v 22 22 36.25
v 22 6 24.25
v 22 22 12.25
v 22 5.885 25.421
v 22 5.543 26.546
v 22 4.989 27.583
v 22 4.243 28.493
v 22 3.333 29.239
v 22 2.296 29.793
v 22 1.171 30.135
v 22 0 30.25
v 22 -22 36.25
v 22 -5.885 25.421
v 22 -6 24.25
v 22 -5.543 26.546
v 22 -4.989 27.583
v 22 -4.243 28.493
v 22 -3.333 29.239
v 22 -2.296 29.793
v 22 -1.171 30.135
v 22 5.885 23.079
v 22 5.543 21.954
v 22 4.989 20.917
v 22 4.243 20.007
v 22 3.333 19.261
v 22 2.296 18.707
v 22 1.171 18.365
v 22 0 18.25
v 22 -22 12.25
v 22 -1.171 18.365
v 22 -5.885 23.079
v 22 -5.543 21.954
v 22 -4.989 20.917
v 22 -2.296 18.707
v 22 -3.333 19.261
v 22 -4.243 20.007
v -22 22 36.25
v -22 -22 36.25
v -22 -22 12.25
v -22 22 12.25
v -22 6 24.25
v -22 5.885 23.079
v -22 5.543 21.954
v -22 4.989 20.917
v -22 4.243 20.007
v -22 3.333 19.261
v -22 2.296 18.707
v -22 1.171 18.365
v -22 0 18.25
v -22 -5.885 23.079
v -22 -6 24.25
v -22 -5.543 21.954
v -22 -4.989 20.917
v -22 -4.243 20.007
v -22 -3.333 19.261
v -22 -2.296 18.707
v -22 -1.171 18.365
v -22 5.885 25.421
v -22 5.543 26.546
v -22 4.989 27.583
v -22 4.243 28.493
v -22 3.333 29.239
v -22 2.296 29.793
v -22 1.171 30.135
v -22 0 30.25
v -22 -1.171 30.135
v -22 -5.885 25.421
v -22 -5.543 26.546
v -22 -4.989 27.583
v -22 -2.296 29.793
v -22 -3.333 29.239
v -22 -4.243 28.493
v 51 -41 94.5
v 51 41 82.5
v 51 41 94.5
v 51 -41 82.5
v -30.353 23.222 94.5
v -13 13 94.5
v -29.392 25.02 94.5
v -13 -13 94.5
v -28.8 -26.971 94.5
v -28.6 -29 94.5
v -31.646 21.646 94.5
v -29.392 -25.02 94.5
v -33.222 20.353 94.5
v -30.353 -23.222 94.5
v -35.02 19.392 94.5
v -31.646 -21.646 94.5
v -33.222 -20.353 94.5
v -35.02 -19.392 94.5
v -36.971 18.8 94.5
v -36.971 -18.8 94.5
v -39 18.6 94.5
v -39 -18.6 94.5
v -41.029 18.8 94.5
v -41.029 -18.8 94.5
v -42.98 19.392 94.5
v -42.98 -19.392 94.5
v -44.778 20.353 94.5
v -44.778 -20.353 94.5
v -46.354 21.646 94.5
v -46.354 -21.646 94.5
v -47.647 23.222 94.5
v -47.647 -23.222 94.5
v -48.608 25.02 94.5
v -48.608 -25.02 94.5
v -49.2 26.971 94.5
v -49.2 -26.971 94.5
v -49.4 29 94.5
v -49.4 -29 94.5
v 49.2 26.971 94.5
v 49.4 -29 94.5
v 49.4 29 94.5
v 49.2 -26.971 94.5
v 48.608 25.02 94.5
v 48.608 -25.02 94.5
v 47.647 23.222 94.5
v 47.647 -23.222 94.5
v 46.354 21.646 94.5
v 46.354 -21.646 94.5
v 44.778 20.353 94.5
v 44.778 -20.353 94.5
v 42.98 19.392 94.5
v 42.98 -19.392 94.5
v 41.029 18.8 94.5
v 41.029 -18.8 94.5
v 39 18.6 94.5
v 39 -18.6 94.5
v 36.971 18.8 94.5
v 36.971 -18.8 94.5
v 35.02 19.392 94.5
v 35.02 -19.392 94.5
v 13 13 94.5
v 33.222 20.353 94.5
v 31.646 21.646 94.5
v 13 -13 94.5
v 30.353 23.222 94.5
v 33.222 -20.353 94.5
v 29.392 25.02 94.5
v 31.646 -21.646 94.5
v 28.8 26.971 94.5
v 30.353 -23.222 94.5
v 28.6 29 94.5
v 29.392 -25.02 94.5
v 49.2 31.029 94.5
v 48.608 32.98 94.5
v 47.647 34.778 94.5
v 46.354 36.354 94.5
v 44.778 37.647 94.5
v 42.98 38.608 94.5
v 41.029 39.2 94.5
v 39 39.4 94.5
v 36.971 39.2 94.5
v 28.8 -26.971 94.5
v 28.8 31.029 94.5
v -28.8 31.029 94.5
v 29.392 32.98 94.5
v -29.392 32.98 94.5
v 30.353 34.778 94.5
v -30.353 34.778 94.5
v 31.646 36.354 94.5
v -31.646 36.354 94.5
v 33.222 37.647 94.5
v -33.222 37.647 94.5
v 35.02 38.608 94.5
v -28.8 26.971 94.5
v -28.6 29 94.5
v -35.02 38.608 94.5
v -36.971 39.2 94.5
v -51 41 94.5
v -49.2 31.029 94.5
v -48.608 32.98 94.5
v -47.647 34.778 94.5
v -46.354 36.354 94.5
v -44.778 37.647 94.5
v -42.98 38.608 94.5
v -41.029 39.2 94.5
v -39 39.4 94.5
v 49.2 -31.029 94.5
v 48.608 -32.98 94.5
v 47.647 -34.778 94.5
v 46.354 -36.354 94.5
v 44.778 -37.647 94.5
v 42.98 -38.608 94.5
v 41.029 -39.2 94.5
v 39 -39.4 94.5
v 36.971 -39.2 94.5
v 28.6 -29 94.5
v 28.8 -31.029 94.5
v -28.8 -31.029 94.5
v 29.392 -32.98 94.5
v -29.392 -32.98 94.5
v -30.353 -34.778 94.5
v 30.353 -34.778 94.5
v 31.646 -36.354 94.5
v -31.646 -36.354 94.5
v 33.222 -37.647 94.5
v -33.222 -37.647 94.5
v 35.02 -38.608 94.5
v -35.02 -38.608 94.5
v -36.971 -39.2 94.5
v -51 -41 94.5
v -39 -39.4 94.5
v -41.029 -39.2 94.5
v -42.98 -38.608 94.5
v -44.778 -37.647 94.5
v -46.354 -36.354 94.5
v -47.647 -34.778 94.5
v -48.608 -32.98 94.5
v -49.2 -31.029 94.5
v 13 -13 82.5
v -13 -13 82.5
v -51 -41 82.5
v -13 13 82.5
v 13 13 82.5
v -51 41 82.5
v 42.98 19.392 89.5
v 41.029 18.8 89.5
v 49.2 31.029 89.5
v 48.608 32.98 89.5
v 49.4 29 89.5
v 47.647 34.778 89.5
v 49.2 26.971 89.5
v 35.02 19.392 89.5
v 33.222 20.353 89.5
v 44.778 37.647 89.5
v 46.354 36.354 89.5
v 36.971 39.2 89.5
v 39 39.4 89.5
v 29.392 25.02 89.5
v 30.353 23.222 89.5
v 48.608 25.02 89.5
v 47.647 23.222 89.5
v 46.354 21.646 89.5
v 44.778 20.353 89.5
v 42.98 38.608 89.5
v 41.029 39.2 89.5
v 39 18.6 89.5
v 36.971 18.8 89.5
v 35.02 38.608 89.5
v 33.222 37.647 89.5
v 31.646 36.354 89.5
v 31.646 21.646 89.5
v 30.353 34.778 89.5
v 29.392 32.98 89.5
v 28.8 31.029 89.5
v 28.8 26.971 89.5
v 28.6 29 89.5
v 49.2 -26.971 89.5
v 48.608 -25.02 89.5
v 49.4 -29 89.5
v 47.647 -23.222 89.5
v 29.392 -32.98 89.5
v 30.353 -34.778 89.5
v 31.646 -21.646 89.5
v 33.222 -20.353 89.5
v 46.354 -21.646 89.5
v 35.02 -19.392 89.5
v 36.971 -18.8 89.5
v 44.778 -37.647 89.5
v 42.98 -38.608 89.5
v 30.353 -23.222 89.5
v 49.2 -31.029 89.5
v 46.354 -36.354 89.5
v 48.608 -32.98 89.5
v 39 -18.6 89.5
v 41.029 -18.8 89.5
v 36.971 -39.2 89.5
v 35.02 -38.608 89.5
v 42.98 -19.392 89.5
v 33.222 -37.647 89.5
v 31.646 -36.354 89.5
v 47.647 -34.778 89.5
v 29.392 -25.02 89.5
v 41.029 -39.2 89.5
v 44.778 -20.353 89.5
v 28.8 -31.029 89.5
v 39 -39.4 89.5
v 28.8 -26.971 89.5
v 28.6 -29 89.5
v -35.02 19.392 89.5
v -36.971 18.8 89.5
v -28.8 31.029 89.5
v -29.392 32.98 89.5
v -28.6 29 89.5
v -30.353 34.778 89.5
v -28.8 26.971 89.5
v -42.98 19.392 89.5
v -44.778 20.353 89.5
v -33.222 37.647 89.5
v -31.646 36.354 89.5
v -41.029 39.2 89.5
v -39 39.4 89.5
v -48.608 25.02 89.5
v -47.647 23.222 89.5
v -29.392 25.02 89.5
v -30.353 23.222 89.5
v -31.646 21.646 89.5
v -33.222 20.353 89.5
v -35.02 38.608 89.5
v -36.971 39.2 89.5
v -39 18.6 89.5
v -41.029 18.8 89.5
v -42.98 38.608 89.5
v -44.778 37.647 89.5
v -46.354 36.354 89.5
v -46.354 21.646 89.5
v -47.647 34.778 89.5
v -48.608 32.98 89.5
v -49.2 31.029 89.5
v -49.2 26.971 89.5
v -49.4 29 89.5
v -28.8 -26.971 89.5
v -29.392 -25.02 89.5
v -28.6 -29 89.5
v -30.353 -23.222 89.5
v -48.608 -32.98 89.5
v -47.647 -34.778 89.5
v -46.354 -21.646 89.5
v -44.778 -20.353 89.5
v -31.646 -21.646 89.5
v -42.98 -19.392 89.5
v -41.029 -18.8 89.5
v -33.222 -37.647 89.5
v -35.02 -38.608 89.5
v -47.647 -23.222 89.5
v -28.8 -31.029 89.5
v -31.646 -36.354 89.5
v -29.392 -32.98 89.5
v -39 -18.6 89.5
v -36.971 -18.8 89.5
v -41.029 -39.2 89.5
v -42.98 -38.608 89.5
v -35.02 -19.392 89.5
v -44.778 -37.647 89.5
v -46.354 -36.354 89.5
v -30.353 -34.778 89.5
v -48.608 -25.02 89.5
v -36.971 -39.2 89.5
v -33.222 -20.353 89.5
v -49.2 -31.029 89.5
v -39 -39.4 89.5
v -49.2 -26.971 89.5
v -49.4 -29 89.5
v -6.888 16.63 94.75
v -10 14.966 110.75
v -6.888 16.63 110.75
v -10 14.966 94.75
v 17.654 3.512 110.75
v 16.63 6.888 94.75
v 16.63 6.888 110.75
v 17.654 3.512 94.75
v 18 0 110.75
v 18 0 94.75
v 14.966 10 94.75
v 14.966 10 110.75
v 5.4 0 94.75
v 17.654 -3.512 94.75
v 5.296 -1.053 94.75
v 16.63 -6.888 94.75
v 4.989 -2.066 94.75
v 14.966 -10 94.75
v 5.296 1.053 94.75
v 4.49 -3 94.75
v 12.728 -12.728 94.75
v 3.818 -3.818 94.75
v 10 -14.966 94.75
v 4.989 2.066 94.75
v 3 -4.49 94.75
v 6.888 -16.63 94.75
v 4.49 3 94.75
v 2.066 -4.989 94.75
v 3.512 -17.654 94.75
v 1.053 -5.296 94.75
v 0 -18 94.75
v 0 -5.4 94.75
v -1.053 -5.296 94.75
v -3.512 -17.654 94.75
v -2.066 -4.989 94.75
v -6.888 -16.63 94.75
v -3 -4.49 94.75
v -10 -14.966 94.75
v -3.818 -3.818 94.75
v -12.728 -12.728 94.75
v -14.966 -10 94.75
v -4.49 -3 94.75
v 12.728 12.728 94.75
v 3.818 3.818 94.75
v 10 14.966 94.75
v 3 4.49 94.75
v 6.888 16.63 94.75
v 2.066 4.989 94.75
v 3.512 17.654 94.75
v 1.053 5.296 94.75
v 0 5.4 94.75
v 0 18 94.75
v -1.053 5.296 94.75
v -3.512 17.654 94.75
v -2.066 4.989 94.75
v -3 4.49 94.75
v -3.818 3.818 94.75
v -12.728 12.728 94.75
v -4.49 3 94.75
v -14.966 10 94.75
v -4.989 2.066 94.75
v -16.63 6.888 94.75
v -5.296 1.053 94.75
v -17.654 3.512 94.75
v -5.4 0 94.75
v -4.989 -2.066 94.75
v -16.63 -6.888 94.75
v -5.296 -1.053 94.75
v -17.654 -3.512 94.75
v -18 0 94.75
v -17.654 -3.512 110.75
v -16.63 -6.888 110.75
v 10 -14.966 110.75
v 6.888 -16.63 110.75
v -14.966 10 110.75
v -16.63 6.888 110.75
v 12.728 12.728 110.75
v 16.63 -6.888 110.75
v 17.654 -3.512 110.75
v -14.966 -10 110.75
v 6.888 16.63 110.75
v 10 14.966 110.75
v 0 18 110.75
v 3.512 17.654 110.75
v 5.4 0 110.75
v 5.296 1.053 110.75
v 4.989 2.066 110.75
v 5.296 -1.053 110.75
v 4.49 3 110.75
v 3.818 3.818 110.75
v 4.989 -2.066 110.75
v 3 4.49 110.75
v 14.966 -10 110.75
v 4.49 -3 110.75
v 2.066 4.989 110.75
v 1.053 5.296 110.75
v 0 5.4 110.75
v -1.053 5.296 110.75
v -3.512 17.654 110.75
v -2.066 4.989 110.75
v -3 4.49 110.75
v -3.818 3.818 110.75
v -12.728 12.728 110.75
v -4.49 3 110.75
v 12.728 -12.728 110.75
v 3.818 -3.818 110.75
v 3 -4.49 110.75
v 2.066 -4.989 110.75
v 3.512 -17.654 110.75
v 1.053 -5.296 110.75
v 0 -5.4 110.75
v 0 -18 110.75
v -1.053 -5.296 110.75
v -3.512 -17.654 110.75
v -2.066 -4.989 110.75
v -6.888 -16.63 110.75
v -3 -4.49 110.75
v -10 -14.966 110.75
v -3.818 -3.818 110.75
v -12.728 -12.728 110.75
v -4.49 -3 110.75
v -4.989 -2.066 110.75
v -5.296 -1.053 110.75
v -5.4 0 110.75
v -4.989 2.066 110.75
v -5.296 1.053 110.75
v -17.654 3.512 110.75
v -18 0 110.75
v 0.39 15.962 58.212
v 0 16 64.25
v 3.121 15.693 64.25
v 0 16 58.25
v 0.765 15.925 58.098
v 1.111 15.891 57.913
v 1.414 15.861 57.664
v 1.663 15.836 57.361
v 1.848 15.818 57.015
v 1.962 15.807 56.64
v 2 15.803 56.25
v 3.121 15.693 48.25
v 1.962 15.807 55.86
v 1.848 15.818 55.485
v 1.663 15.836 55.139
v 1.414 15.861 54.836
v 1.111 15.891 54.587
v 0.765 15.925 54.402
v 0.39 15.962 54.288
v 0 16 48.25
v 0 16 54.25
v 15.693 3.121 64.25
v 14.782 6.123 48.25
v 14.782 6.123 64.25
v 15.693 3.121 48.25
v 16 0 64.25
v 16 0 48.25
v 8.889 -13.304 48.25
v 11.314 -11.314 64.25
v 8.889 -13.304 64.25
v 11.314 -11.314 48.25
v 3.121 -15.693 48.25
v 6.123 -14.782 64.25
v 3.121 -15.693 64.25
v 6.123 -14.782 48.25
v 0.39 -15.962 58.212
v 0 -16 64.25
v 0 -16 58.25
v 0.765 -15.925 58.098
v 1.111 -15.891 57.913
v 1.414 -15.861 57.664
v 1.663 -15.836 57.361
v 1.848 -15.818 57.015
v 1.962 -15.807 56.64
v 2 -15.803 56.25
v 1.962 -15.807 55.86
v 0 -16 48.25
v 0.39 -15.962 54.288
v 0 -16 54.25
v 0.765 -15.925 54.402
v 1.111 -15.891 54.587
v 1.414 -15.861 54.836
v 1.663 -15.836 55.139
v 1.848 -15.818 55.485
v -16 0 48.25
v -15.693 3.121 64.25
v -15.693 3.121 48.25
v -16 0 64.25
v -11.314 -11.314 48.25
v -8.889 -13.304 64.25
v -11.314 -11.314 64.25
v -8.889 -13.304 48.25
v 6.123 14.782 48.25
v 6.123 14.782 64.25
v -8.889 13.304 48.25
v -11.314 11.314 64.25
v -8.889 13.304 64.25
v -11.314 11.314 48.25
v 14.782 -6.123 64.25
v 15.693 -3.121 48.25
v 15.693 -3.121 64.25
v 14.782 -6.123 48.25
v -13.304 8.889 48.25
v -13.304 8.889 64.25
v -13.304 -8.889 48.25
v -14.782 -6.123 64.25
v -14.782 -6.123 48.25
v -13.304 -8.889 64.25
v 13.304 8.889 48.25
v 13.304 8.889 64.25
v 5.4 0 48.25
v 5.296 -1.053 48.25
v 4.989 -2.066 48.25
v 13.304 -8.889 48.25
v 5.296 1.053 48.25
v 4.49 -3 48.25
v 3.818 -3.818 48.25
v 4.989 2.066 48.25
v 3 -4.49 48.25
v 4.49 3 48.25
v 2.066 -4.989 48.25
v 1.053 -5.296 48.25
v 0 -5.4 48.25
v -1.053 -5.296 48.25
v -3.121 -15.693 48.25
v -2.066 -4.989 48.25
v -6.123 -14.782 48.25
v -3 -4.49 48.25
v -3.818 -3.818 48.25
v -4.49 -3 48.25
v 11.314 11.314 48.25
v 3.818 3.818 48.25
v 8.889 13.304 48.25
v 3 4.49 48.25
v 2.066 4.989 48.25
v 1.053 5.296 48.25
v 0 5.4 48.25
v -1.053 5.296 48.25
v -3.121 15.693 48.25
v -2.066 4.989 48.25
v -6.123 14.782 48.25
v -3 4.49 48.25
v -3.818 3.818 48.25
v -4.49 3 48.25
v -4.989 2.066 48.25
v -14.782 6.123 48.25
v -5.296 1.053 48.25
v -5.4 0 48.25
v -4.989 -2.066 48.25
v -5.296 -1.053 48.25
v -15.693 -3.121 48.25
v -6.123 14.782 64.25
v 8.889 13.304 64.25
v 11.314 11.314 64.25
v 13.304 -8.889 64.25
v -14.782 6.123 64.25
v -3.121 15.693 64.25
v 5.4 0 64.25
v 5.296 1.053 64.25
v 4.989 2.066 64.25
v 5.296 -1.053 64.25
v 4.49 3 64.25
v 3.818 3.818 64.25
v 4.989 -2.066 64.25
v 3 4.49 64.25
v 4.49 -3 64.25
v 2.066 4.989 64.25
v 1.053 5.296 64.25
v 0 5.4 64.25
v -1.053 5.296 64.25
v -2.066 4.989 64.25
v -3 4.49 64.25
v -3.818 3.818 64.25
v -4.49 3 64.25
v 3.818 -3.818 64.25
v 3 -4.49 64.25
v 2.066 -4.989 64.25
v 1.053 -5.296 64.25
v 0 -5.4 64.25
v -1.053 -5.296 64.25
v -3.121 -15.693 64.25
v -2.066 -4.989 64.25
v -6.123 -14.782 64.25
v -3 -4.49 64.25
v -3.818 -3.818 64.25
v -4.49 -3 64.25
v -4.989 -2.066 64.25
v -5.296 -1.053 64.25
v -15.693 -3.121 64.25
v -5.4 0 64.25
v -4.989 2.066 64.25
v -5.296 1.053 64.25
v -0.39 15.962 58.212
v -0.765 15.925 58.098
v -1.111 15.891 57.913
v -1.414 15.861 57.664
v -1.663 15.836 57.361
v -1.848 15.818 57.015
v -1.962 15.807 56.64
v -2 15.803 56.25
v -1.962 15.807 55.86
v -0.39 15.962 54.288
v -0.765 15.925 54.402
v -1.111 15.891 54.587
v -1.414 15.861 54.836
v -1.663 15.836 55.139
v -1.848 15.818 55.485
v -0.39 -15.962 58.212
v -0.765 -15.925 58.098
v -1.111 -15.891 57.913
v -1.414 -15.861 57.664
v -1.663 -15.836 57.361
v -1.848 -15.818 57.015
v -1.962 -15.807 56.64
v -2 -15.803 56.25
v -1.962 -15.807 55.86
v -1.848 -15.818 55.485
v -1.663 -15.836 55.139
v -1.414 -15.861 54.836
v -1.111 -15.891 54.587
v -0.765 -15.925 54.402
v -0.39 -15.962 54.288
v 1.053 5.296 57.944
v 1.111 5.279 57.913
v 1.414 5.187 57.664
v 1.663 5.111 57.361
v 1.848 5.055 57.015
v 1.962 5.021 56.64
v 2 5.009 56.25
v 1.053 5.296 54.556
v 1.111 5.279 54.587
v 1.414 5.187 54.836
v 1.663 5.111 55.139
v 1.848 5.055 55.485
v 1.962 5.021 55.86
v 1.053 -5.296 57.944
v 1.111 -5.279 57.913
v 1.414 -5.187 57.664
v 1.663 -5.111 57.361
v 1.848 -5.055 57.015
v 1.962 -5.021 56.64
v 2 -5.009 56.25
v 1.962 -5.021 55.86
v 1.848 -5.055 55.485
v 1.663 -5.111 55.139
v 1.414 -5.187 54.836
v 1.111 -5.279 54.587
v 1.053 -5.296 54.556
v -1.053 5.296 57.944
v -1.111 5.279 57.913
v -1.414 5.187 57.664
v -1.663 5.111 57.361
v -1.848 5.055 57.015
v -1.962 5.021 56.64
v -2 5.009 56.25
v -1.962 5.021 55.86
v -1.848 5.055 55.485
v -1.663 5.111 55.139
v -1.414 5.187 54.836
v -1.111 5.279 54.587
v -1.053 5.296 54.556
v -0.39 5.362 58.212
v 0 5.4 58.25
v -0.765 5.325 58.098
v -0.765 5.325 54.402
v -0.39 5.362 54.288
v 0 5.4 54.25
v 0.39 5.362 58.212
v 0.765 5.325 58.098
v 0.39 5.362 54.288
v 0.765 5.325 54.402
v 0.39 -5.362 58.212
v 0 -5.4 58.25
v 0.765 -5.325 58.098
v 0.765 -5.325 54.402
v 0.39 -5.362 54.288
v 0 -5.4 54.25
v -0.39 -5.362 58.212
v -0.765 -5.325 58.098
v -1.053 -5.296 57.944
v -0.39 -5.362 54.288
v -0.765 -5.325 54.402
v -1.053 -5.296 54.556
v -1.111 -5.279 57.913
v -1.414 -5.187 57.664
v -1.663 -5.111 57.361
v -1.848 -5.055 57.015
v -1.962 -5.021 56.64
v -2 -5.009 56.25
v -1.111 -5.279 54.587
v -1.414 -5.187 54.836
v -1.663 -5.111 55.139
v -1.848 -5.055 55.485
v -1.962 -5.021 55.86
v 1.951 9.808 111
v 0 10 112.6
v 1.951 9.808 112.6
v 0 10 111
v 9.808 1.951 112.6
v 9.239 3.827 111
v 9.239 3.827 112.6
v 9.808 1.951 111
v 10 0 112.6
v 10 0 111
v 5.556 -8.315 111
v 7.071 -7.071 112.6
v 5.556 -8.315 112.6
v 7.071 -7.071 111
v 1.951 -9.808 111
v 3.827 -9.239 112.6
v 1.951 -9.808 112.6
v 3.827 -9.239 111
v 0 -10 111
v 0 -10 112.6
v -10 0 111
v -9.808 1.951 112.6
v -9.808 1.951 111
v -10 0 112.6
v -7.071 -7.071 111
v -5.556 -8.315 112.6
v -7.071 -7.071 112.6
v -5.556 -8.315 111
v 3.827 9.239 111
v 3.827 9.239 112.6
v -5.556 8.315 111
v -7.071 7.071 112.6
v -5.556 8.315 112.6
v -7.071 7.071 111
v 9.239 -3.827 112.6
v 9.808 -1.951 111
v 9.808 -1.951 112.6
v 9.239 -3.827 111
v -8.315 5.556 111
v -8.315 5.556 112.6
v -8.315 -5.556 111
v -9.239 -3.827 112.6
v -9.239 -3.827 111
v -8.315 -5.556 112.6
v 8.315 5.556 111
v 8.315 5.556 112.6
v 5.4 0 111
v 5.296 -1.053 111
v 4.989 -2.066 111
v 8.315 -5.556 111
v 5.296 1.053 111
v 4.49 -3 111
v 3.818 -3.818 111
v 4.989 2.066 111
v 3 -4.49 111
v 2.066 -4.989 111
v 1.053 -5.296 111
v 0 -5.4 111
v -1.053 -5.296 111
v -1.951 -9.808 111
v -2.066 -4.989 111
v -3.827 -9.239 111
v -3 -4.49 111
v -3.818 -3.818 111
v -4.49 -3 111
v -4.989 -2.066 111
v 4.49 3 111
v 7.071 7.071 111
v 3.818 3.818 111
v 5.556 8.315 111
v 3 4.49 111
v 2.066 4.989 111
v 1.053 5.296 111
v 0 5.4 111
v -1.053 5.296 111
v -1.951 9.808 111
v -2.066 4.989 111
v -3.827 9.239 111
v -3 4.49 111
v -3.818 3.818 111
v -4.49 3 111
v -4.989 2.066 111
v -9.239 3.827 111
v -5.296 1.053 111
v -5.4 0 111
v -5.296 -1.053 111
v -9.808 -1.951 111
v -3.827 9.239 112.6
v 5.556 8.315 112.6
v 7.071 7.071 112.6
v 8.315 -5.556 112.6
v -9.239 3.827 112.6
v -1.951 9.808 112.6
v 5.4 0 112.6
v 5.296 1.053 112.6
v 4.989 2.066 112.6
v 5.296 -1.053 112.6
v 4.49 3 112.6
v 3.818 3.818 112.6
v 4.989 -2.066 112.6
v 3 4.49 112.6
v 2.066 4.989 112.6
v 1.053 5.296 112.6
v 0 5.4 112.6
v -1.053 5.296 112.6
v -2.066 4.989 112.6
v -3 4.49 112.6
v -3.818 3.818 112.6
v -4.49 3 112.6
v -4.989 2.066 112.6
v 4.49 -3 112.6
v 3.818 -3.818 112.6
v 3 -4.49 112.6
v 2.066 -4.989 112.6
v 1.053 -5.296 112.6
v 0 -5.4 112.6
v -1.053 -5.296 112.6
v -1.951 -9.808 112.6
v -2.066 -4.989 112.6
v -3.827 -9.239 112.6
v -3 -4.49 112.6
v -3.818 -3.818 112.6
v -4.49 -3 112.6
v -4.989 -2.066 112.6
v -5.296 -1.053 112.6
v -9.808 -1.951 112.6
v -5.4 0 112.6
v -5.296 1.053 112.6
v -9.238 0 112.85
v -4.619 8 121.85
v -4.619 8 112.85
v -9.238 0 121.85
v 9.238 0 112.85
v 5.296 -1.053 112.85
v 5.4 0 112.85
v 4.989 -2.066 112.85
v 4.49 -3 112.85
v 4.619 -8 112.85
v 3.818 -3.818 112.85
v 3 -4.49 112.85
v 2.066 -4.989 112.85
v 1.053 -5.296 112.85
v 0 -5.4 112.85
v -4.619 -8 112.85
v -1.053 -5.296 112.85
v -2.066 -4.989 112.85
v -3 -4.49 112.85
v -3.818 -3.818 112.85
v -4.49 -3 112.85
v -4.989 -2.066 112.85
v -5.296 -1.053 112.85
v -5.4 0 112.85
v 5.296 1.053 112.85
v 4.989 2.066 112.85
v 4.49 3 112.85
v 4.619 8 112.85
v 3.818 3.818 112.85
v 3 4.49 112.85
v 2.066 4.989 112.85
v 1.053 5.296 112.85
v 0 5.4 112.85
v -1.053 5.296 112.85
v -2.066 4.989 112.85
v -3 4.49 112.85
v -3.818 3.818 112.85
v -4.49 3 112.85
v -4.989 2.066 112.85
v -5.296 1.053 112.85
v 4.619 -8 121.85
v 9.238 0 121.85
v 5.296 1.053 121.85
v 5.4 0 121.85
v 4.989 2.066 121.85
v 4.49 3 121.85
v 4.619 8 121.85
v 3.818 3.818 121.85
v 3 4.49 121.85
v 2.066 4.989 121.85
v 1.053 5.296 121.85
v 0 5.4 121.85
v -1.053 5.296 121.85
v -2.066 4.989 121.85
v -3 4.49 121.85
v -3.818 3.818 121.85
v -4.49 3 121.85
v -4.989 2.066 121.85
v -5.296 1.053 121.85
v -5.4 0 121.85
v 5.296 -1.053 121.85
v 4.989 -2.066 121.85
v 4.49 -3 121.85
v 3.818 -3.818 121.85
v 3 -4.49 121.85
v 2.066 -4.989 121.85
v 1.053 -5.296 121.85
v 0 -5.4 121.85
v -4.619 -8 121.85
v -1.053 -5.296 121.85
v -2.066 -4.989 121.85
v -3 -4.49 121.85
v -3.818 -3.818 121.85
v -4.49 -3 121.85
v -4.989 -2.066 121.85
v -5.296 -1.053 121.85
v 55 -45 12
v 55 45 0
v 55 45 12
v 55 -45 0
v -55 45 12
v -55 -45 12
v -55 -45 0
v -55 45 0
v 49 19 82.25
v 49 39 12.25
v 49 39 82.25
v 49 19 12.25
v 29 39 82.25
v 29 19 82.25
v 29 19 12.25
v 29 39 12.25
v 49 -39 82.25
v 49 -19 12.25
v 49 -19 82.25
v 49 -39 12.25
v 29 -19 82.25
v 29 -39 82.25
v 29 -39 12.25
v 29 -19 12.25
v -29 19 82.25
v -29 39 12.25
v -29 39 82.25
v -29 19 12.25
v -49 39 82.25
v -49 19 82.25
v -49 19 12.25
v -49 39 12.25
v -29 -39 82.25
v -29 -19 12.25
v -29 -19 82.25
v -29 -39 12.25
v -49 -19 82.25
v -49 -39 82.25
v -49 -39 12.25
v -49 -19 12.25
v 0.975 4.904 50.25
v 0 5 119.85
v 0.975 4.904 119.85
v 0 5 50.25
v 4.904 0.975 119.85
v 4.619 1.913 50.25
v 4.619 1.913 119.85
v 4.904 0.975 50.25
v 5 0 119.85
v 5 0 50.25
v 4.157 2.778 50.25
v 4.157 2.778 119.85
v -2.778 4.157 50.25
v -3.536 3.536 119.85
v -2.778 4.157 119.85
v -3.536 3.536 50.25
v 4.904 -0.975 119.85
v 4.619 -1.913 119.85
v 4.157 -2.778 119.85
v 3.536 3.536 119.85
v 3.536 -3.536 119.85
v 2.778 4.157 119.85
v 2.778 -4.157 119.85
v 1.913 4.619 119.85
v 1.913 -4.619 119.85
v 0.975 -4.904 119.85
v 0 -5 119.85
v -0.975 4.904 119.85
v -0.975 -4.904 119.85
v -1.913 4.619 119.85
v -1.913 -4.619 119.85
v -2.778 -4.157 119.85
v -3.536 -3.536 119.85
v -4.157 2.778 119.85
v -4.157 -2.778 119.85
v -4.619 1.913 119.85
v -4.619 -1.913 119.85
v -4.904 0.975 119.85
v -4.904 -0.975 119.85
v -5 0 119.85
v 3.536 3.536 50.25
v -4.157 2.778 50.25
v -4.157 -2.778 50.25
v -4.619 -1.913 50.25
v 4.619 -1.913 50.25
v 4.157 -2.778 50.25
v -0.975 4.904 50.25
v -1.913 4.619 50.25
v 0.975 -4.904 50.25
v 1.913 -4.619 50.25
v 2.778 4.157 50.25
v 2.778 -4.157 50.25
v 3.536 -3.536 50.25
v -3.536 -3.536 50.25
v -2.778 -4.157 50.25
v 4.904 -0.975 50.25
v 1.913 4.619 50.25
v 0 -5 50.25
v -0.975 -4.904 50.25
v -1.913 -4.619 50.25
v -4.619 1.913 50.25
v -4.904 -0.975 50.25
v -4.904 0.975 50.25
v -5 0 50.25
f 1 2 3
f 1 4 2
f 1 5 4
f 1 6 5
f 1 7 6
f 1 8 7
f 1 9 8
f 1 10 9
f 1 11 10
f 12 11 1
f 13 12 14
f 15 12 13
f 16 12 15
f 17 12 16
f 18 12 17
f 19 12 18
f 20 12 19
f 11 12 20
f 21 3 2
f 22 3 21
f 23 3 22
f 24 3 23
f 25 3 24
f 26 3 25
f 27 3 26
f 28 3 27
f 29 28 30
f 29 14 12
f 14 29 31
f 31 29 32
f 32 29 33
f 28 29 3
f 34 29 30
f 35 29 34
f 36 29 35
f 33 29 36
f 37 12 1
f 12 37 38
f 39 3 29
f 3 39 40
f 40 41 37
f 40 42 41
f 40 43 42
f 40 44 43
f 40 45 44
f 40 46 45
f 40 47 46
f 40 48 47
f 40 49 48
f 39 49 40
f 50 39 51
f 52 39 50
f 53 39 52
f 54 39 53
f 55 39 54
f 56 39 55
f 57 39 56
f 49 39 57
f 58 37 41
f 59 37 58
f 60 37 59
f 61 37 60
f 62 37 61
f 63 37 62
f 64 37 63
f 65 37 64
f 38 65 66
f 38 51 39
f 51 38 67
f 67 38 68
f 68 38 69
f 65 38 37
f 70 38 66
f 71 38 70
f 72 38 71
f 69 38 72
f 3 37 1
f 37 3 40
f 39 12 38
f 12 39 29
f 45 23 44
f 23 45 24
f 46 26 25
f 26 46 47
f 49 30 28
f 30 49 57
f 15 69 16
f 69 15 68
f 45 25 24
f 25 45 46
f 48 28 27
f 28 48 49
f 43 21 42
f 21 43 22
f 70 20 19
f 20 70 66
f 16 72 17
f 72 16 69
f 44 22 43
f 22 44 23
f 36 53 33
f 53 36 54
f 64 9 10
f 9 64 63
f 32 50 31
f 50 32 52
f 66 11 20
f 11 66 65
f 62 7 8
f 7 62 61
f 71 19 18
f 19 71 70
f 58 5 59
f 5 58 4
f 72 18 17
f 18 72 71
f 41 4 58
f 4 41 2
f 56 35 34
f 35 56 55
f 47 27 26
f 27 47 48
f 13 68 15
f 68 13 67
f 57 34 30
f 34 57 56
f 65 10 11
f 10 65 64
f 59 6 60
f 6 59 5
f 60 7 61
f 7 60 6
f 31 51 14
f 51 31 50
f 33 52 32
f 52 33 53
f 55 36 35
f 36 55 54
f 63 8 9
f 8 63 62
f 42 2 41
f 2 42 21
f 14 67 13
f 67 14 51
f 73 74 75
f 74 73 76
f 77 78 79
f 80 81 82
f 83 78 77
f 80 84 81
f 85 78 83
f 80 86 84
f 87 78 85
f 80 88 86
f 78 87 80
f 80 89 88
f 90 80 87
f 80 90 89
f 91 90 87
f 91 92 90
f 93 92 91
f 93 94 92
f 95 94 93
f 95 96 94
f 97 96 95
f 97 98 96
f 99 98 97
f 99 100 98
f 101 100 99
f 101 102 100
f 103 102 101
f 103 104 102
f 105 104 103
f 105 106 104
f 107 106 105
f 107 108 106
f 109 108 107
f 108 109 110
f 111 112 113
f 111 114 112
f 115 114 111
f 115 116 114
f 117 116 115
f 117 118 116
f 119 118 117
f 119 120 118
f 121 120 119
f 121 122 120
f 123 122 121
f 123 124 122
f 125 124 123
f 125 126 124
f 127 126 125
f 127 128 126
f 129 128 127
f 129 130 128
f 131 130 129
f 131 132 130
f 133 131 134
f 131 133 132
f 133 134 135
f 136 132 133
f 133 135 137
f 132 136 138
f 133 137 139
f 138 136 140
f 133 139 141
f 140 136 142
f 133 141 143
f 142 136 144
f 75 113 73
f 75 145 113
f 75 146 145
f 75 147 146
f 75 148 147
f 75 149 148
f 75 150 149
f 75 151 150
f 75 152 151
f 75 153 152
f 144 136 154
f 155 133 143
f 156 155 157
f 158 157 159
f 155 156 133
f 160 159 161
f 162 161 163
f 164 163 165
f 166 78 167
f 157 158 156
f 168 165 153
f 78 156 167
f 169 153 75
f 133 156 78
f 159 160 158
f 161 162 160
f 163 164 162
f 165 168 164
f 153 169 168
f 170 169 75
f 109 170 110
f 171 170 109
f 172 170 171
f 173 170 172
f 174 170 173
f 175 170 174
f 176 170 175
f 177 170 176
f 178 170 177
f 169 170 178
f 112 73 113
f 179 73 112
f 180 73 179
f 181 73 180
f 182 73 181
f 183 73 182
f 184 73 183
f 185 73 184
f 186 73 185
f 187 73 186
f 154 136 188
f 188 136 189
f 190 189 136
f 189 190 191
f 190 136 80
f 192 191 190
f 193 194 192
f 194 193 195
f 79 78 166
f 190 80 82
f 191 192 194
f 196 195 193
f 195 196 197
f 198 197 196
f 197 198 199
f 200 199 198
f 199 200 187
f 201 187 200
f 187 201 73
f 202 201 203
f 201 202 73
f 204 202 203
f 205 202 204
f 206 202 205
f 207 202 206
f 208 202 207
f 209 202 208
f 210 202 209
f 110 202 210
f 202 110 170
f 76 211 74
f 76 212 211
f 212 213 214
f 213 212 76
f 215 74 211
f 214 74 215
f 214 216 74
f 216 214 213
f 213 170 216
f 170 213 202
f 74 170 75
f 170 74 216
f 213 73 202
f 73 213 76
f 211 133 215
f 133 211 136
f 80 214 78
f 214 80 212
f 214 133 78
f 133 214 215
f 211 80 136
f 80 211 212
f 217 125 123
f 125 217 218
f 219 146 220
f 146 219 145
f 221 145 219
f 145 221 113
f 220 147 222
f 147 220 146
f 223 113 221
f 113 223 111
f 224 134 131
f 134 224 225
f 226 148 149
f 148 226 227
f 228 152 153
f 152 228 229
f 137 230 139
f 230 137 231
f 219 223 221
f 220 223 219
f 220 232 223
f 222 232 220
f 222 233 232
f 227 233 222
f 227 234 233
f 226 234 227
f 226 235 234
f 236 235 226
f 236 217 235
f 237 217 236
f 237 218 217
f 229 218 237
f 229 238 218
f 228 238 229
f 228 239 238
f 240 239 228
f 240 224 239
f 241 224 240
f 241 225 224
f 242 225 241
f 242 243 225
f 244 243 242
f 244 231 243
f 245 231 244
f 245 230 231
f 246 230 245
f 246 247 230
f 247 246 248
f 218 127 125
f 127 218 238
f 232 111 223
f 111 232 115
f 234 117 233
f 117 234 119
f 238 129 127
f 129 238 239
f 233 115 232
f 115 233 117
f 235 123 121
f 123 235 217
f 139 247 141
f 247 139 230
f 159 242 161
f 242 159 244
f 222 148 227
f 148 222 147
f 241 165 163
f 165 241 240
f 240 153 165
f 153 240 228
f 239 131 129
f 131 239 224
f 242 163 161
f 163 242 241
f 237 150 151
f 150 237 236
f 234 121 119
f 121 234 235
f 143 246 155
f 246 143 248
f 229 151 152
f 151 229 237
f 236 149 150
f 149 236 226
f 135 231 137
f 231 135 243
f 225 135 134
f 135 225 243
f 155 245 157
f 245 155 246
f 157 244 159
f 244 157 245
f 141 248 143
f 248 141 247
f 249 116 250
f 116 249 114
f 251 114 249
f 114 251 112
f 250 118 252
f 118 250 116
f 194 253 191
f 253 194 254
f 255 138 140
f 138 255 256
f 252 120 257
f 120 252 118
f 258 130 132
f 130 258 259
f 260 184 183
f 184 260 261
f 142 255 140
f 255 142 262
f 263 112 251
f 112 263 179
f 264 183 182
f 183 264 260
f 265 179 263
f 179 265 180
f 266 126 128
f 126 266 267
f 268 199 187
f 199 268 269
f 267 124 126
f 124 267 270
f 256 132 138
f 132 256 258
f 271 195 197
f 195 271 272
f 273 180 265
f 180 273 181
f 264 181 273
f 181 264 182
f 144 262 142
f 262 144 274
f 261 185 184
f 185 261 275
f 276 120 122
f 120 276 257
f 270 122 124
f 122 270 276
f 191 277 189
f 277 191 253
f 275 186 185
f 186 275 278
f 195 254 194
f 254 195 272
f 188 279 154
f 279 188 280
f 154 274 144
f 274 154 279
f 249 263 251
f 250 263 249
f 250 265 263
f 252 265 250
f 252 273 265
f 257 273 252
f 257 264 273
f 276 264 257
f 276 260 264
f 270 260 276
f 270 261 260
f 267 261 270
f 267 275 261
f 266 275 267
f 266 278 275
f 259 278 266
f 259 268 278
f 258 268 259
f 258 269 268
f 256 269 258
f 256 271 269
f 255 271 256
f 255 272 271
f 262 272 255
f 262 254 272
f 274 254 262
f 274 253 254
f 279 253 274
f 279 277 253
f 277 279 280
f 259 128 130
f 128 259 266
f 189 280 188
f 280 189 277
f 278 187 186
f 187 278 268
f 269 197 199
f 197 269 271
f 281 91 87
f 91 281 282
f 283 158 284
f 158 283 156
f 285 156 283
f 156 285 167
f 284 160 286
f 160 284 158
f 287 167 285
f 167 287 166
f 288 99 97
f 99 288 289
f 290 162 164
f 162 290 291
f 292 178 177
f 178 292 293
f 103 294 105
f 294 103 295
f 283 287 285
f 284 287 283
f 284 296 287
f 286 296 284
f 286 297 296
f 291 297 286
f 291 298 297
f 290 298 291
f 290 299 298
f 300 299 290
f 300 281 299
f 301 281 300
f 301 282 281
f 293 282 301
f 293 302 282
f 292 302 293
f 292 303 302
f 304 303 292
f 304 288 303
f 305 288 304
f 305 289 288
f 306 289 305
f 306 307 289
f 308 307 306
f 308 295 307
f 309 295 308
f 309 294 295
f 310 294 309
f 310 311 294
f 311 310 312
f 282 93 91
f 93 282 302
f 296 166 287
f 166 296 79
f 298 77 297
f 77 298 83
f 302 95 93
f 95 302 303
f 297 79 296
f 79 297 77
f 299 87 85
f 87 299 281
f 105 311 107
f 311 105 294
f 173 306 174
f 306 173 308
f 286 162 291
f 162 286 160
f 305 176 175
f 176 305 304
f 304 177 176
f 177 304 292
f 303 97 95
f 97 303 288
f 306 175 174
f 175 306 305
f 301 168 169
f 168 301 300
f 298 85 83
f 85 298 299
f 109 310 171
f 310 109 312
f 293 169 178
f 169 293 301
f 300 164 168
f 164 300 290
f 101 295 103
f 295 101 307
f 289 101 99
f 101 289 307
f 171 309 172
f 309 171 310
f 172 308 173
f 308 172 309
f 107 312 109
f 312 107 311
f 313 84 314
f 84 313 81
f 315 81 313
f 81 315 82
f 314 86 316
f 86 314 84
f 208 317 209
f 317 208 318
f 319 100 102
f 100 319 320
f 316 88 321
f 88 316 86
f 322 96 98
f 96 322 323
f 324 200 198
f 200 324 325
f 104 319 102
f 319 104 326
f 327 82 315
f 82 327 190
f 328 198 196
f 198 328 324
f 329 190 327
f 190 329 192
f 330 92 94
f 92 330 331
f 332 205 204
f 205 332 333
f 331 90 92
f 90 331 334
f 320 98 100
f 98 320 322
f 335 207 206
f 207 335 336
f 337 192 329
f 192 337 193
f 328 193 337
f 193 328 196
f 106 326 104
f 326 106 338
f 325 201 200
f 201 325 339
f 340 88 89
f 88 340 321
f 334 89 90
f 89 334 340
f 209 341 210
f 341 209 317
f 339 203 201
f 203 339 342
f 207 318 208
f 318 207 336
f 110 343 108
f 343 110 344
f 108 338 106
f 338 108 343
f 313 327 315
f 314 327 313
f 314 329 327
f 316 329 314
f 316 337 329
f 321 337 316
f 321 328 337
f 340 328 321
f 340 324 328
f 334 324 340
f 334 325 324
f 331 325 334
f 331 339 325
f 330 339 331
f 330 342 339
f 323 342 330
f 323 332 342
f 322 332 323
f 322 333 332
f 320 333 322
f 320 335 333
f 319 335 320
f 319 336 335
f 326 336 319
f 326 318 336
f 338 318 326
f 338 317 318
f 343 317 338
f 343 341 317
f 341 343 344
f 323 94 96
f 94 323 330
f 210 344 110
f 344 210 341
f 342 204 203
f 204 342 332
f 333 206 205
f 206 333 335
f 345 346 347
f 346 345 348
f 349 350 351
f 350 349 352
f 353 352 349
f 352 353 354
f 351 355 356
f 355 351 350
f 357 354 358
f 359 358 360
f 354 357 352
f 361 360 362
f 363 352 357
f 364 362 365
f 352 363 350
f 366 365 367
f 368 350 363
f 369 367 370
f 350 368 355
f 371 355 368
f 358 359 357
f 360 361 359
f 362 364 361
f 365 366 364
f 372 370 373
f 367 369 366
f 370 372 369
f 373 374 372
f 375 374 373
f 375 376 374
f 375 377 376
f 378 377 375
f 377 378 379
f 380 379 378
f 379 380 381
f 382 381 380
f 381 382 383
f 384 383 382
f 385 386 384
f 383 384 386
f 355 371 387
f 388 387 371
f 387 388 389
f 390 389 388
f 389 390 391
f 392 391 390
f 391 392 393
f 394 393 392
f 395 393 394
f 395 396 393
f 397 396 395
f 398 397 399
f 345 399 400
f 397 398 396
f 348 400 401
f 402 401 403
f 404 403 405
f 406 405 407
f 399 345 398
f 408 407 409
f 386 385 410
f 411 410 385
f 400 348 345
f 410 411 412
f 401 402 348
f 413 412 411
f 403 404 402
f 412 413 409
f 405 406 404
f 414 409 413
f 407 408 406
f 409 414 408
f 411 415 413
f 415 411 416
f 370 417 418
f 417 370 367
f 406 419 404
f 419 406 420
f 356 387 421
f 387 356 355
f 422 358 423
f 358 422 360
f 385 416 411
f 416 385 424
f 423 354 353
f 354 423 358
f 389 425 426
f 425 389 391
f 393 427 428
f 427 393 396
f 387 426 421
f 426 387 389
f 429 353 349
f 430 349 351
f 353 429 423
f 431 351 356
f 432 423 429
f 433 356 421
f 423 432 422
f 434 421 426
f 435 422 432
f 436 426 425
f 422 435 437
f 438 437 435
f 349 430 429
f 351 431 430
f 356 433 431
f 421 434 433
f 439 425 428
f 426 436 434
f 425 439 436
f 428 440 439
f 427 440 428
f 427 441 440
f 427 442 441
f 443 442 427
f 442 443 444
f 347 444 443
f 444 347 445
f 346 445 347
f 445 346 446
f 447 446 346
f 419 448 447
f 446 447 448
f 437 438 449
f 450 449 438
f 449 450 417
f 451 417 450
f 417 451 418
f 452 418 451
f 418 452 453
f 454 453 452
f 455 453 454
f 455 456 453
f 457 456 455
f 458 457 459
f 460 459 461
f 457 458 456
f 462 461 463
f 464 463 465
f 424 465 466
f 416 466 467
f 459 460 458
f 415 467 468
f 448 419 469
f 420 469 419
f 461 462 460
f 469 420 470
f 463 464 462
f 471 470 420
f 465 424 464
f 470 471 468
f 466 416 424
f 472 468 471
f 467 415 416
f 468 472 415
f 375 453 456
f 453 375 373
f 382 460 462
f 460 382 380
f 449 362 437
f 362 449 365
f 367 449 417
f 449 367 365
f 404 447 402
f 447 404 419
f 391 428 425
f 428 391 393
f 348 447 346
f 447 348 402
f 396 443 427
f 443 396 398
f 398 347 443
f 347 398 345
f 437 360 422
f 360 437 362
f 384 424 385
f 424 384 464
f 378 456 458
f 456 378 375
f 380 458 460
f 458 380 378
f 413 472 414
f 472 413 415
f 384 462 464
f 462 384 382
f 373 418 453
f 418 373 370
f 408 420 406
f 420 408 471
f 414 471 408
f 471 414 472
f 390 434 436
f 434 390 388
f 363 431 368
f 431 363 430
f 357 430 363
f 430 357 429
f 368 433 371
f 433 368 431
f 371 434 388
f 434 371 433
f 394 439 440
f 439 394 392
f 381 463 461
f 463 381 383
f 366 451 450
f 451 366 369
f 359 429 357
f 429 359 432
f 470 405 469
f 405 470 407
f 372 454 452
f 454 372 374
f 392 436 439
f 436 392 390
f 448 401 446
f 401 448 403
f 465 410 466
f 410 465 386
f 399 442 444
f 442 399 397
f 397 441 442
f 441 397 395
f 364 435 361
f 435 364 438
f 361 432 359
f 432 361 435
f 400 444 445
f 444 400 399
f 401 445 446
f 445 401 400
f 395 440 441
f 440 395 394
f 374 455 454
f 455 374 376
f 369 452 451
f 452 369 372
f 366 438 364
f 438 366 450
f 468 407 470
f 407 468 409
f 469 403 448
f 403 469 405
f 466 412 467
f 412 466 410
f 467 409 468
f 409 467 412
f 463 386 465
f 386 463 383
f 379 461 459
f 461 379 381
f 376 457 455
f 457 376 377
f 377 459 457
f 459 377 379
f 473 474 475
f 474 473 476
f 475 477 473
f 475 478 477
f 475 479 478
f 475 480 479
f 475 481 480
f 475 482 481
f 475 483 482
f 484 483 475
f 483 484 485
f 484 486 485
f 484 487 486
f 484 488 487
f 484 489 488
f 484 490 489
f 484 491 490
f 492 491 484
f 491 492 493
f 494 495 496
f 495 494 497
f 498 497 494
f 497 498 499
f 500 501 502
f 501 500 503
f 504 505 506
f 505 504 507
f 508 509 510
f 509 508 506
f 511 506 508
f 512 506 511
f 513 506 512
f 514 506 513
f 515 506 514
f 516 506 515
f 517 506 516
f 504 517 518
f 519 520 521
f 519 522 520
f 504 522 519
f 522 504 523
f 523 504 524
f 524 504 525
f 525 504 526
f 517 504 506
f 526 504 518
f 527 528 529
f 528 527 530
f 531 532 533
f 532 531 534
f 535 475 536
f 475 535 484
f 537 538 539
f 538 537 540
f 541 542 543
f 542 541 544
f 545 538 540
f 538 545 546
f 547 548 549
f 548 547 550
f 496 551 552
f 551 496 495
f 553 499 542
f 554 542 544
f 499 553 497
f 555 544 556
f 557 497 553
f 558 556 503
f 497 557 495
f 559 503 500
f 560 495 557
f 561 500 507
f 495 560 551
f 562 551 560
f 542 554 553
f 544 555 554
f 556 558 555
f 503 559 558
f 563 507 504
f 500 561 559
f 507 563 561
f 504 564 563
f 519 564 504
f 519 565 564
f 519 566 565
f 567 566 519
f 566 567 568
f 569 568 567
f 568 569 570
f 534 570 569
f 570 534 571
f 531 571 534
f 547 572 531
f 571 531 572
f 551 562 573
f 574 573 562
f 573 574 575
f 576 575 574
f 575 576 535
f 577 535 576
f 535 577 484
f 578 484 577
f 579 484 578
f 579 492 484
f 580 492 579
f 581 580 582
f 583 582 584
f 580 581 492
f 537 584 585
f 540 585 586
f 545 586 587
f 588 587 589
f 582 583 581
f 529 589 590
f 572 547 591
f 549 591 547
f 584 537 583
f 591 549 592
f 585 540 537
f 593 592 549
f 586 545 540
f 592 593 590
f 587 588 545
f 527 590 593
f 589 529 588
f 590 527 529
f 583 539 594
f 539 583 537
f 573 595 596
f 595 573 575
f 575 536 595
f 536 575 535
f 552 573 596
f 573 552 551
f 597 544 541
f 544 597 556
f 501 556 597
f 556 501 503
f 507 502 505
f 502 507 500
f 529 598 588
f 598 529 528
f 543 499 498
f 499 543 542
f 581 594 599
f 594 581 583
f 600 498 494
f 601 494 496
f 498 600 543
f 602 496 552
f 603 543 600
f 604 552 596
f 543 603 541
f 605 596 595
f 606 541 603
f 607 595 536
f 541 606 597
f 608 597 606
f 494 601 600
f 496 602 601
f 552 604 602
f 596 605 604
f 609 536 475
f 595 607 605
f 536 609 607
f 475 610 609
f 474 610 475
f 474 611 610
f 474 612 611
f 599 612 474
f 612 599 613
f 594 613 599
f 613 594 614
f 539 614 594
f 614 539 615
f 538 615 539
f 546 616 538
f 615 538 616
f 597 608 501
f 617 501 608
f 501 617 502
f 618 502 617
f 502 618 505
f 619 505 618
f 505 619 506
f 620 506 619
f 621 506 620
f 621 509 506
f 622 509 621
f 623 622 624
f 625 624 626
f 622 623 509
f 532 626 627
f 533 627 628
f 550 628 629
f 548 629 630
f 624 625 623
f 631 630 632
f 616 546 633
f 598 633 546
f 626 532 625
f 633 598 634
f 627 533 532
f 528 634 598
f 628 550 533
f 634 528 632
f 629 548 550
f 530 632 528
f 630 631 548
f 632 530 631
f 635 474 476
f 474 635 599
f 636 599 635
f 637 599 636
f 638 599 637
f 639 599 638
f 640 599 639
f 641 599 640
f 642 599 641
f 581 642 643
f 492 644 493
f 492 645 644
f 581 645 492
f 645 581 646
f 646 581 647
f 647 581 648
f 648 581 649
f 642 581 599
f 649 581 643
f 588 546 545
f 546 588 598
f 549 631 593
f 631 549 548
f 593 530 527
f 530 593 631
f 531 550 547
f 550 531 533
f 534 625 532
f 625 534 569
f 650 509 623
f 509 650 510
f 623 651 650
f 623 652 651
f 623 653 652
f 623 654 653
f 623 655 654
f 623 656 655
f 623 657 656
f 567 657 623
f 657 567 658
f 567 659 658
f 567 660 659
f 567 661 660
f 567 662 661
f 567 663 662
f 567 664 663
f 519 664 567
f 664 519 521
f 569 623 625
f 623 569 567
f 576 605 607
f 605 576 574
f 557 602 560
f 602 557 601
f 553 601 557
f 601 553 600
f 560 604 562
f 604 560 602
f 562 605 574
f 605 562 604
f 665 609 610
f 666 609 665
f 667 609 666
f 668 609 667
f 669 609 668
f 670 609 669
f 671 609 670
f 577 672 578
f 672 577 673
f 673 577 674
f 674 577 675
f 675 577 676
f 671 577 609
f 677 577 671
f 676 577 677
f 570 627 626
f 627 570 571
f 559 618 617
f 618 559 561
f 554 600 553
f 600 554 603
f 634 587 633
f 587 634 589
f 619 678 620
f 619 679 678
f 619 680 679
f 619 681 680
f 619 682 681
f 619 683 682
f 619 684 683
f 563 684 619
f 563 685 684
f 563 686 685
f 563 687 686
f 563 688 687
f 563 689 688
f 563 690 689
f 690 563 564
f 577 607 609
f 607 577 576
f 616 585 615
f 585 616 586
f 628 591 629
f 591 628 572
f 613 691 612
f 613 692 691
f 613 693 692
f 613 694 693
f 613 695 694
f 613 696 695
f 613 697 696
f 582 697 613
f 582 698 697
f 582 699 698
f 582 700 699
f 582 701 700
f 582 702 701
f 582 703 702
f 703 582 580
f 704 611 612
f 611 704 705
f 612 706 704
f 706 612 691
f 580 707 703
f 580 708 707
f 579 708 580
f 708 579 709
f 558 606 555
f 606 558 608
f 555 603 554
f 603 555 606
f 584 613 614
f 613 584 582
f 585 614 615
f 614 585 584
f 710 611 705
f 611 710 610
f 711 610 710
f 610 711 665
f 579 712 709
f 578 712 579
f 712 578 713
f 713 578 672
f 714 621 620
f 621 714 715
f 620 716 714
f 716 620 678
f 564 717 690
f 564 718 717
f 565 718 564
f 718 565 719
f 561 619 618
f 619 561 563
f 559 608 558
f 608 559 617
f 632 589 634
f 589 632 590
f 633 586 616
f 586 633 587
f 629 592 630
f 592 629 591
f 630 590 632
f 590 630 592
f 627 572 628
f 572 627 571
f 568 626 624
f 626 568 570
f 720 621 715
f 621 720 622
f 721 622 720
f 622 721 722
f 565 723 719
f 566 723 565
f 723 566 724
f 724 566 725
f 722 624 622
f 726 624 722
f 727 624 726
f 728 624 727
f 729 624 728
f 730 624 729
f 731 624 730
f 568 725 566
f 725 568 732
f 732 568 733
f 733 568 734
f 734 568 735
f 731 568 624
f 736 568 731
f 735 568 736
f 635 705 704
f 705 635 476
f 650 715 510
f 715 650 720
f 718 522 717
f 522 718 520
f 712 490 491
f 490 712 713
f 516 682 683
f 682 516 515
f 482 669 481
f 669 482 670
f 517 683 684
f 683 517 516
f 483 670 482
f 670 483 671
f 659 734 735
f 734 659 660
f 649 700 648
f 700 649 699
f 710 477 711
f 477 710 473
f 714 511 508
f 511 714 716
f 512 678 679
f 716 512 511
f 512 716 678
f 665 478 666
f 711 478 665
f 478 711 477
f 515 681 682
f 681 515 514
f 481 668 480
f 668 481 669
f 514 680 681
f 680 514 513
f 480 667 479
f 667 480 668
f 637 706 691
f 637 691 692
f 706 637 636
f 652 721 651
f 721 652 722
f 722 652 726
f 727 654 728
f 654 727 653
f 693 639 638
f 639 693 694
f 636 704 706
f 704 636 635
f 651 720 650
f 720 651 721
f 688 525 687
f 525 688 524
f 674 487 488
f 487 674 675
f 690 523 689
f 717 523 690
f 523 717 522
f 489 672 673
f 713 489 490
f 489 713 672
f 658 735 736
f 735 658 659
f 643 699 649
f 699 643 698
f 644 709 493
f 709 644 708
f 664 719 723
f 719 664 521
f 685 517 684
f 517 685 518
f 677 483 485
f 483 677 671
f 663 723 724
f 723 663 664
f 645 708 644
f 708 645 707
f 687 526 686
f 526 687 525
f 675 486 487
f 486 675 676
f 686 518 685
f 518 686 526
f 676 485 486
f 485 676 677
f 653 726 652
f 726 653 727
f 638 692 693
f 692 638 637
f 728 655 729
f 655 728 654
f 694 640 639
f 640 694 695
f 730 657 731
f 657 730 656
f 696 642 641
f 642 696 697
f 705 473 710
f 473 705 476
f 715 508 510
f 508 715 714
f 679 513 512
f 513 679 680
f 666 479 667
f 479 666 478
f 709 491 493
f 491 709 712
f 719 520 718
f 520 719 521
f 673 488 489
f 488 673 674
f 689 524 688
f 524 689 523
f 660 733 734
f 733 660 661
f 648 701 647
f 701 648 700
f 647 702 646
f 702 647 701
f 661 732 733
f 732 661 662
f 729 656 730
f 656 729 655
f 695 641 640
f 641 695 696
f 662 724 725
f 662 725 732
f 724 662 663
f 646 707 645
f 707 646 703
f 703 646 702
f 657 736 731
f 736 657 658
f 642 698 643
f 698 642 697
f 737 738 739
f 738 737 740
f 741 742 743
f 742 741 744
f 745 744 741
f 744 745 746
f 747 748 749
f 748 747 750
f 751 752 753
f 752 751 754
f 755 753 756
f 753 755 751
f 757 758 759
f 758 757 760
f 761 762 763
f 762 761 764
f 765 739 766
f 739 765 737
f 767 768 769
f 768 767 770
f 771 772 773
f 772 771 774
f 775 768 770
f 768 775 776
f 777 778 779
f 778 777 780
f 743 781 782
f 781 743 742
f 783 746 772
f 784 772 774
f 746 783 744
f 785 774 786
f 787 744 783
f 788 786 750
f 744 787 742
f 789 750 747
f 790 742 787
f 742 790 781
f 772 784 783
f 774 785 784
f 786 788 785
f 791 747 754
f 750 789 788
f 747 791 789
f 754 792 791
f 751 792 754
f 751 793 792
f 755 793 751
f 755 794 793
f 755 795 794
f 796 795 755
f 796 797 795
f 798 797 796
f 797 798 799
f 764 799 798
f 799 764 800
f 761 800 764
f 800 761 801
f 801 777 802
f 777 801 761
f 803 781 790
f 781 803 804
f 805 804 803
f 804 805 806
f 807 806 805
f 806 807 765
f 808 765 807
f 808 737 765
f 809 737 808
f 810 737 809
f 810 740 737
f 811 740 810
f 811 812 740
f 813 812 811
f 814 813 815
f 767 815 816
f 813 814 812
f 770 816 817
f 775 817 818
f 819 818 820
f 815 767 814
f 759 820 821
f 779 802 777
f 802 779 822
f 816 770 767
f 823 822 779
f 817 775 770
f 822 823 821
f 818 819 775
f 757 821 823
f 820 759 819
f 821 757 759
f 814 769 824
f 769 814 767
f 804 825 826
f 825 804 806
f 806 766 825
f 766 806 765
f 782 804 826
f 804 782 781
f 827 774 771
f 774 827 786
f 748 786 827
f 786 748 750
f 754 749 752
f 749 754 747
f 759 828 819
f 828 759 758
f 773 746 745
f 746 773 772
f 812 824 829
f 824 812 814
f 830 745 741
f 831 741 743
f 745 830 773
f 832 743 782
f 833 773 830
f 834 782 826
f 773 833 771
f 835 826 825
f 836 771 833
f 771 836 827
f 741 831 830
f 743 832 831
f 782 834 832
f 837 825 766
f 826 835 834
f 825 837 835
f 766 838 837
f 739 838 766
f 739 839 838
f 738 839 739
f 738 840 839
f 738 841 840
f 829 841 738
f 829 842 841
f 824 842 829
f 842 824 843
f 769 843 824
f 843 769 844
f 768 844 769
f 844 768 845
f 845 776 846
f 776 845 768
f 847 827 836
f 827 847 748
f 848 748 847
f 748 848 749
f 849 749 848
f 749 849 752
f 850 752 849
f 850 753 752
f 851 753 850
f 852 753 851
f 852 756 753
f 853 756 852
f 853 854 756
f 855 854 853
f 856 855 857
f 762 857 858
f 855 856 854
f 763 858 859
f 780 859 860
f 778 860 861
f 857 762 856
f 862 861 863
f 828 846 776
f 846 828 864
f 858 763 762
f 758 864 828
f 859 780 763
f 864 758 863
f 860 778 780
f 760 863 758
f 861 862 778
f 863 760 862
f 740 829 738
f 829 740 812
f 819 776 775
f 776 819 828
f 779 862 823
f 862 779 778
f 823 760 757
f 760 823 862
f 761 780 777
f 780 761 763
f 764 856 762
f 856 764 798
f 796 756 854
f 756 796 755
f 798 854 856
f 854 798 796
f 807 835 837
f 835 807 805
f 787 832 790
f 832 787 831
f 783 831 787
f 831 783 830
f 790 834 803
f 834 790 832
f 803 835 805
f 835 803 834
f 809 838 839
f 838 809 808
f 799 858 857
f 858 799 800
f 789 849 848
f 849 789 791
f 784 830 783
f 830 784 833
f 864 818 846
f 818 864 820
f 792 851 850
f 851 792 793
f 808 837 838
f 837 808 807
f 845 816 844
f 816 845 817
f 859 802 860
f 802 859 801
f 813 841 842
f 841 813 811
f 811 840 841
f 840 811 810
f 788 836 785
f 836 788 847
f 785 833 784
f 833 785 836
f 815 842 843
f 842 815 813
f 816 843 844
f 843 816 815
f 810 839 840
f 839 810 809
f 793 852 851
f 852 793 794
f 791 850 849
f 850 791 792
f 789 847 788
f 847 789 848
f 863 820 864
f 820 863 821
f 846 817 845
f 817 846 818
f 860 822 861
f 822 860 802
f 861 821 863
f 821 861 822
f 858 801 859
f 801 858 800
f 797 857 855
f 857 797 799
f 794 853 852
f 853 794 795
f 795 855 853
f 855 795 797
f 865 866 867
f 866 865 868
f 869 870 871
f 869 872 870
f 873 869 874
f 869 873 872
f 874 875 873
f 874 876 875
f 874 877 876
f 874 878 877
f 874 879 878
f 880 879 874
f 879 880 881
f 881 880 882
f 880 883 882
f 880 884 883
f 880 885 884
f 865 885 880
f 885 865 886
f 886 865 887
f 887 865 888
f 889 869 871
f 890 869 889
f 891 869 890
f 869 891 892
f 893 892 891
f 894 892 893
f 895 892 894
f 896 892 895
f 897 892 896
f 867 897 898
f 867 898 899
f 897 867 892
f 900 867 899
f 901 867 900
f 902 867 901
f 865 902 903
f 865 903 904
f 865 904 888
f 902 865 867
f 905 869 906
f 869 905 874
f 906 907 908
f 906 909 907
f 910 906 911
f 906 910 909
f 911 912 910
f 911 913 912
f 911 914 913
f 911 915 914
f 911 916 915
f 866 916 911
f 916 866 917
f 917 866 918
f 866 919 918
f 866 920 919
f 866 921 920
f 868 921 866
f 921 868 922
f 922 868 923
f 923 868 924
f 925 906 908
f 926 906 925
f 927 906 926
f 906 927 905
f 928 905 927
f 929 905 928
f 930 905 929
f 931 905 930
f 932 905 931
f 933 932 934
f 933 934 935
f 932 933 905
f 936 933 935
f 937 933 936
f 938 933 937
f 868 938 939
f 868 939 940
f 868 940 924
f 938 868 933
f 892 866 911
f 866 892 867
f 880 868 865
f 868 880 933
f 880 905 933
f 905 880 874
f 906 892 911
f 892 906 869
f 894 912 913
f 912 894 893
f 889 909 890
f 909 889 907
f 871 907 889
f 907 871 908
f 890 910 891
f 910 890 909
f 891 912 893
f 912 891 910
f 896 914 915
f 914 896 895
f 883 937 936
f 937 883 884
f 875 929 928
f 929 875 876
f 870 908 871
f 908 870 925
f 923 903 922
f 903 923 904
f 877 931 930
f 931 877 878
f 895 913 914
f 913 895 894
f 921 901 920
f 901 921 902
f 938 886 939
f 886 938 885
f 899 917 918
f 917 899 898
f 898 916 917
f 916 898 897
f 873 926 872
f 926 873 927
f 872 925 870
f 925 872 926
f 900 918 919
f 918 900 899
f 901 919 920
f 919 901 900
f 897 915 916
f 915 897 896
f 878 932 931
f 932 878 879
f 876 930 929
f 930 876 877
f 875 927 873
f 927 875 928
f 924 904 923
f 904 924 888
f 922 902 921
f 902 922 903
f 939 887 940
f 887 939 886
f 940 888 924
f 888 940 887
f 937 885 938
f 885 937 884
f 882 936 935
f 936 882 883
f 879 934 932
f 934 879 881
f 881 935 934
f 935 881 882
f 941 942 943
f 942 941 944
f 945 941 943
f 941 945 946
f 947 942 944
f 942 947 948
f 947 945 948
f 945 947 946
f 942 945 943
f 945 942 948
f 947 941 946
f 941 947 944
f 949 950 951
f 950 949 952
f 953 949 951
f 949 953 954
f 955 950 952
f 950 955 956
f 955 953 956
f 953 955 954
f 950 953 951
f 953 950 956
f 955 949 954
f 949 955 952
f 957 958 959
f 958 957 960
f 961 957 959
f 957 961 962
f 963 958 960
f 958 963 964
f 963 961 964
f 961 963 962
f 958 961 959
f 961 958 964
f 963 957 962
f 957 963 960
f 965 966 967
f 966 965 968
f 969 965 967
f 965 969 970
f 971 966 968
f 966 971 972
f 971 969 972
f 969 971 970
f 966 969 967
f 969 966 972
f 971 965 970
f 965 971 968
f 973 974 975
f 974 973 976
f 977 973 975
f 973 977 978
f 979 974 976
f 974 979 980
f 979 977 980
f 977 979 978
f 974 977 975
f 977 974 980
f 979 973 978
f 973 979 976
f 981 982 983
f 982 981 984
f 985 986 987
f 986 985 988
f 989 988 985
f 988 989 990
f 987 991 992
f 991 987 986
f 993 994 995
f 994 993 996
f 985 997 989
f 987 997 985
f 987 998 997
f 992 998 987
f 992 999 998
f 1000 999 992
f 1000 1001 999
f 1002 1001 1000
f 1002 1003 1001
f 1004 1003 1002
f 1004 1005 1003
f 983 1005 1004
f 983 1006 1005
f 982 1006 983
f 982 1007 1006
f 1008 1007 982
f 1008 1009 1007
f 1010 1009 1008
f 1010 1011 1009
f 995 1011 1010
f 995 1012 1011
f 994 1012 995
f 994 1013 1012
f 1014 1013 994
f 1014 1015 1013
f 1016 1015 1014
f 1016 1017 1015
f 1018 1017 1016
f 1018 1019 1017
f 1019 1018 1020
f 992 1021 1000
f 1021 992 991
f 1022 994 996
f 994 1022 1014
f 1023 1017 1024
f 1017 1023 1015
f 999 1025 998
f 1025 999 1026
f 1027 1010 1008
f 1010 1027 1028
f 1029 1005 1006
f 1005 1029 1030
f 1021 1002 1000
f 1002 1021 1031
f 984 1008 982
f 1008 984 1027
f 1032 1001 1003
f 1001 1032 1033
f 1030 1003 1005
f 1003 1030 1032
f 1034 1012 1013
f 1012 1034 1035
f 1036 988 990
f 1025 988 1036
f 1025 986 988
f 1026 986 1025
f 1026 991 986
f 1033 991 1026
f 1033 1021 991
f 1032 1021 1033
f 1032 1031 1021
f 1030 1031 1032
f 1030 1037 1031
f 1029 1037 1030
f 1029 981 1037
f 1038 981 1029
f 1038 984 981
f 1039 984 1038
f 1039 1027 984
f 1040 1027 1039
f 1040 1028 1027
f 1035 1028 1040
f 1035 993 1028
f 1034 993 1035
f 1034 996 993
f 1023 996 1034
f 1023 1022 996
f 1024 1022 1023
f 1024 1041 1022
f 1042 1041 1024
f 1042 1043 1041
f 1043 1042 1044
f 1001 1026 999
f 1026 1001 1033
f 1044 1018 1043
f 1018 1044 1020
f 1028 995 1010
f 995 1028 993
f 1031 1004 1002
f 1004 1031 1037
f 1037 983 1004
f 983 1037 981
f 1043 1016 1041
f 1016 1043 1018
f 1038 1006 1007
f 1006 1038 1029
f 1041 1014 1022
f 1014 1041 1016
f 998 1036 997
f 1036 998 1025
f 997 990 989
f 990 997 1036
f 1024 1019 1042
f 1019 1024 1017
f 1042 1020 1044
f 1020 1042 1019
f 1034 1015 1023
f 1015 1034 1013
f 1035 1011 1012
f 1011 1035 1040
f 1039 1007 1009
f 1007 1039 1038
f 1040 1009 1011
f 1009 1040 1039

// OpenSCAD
$fn = 32;

// ------------------------------------------------------------------------
// Arbor press fixture: screw d10, posts 70 mm, gap 12 mm
// Every part is its own module, assembly() places every instance.
// ------------------------------------------------------------------------

// --- part 1 ---
module press_bed() {
  difference() {
    translate([-55, -45, 0]) cube([110, 90, 12]);
  }
}

// --- part 2 ---
module anvil_block() {
  difference() {
    translate([-22, -22, 0]) cube([44, 44, 24]);
    translate([0, 0, 12]) rotate([0, 90, 0]) cylinder(h = 46, d = 12, center = true);
  }
}

// --- part 3 ---
module press_post_a() {
  translate([-10, -10, 0]) cube([20, 20, 70]);
}

// --- part 4 ---
module press_post_b() {
  translate([-10, -10, 0]) cube([20, 20, 70]);
}

// --- part 5 ---
module press_post_c() {
  translate([-10, -10, 0]) cube([20, 20, 70]);
}

// --- part 6 ---
module press_post_d() {
  translate([-10, -10, 0]) cube([20, 20, 70]);
}

// --- part 7 ---
module press_frame() {
  difference() {
    translate([-51, -41, 0]) cube([102, 82, 12]);
    translate([-13, -13, -1]) cube([26, 26, 14]);
    translate([39, 29, 7]) cylinder(h = 6, d = 20.8);
    translate([39, -29, 7]) cylinder(h = 6, d = 20.8);
    translate([-39, 29, 7]) cylinder(h = 6, d = 20.8);
    translate([-39, -29, 7]) cylinder(h = 6, d = 20.8);
  }
}

// --- part 8 ---
module guide_ring() {
  difference() {
      translate([0, 0, 0]) cylinder(h = 16, d = 36);
      translate([0, 0, -1]) cylinder(h = 18, d = 10.8);
    }
}

// --- part 9 ---
module press_screw() {
  translate([0, 0, -34.8]) cylinder(h = 69.6, d = 10);
}

// --- part 10 ---
module press_head() {
  difference() {
    cylinder(h = 16, d = 32);
    translate([0, 0, -1]) cylinder(h = 18, d = 10.8);
    translate([0, 0, 8]) rotate([90, 0, 0]) cylinder(h = 34, d = 4, center = true);
  }
}

// --- part 11 ---
module nut_washer() {
  difference() {
      translate([0, 0, 0]) cylinder(h = 1.6, d = 20);
      translate([0, 0, -1]) cylinder(h = 3.6, d = 10.8);
    }
}

// --- part 12 ---
module press_nut() {
  difference() {
    linear_extrude(height = 9) polygon(points = [[9.238, 0], [4.619, 8], [-4.619, 8], [-9.238, 0], [-4.619, -8], [4.619, -8]]);
    translate([0, 0, -1]) cylinder(h = 11, d = 10.8);
  }
}

// --- assembly ---
module assembly() {
  color([0.80, 0.24, 0.20]) translate([0, 0, 0]) rotate([0, 0, 0]) press_bed();
  color([0.20, 0.45, 0.75]) translate([0, 0, 12.25]) rotate([0, 0, 0]) anvil_block();
  color([0.25, 0.62, 0.32]) translate([39, 29, 12.25]) rotate([0, 0, 0]) press_post_a();
  color([0.92, 0.70, 0.18]) translate([39, -29, 12.25]) rotate([0, 0, 0]) press_post_b();
  color([0.58, 0.35, 0.70]) translate([-39, 29, 12.25]) rotate([0, 0, 0]) press_post_c();
  color([0.16, 0.66, 0.66]) translate([-39, -29, 12.25]) rotate([0, 0, 0]) press_post_d();
  color([0.85, 0.48, 0.18]) translate([0, 0, 82.5]) rotate([0, 0, 0]) press_frame();
  color([0.55, 0.60, 0.65]) translate([0, 0, 94.75]) rotate([0, 0, 0]) guide_ring();
  color([0.75, 0.30, 0.55]) translate([0, 0, 85.05]) rotate([0, 0, 0]) press_screw();
  color([0.42, 0.52, 0.28]) translate([0, 0, 48.25]) rotate([0, 0, 0]) press_head();
  color([0.80, 0.24, 0.20]) translate([0, 0, 111]) rotate([0, 0, 0]) nut_washer();
  color([0.20, 0.45, 0.75]) translate([0, 0, 112.85]) rotate([0, 0, 0]) press_nut();
}

assembly();
